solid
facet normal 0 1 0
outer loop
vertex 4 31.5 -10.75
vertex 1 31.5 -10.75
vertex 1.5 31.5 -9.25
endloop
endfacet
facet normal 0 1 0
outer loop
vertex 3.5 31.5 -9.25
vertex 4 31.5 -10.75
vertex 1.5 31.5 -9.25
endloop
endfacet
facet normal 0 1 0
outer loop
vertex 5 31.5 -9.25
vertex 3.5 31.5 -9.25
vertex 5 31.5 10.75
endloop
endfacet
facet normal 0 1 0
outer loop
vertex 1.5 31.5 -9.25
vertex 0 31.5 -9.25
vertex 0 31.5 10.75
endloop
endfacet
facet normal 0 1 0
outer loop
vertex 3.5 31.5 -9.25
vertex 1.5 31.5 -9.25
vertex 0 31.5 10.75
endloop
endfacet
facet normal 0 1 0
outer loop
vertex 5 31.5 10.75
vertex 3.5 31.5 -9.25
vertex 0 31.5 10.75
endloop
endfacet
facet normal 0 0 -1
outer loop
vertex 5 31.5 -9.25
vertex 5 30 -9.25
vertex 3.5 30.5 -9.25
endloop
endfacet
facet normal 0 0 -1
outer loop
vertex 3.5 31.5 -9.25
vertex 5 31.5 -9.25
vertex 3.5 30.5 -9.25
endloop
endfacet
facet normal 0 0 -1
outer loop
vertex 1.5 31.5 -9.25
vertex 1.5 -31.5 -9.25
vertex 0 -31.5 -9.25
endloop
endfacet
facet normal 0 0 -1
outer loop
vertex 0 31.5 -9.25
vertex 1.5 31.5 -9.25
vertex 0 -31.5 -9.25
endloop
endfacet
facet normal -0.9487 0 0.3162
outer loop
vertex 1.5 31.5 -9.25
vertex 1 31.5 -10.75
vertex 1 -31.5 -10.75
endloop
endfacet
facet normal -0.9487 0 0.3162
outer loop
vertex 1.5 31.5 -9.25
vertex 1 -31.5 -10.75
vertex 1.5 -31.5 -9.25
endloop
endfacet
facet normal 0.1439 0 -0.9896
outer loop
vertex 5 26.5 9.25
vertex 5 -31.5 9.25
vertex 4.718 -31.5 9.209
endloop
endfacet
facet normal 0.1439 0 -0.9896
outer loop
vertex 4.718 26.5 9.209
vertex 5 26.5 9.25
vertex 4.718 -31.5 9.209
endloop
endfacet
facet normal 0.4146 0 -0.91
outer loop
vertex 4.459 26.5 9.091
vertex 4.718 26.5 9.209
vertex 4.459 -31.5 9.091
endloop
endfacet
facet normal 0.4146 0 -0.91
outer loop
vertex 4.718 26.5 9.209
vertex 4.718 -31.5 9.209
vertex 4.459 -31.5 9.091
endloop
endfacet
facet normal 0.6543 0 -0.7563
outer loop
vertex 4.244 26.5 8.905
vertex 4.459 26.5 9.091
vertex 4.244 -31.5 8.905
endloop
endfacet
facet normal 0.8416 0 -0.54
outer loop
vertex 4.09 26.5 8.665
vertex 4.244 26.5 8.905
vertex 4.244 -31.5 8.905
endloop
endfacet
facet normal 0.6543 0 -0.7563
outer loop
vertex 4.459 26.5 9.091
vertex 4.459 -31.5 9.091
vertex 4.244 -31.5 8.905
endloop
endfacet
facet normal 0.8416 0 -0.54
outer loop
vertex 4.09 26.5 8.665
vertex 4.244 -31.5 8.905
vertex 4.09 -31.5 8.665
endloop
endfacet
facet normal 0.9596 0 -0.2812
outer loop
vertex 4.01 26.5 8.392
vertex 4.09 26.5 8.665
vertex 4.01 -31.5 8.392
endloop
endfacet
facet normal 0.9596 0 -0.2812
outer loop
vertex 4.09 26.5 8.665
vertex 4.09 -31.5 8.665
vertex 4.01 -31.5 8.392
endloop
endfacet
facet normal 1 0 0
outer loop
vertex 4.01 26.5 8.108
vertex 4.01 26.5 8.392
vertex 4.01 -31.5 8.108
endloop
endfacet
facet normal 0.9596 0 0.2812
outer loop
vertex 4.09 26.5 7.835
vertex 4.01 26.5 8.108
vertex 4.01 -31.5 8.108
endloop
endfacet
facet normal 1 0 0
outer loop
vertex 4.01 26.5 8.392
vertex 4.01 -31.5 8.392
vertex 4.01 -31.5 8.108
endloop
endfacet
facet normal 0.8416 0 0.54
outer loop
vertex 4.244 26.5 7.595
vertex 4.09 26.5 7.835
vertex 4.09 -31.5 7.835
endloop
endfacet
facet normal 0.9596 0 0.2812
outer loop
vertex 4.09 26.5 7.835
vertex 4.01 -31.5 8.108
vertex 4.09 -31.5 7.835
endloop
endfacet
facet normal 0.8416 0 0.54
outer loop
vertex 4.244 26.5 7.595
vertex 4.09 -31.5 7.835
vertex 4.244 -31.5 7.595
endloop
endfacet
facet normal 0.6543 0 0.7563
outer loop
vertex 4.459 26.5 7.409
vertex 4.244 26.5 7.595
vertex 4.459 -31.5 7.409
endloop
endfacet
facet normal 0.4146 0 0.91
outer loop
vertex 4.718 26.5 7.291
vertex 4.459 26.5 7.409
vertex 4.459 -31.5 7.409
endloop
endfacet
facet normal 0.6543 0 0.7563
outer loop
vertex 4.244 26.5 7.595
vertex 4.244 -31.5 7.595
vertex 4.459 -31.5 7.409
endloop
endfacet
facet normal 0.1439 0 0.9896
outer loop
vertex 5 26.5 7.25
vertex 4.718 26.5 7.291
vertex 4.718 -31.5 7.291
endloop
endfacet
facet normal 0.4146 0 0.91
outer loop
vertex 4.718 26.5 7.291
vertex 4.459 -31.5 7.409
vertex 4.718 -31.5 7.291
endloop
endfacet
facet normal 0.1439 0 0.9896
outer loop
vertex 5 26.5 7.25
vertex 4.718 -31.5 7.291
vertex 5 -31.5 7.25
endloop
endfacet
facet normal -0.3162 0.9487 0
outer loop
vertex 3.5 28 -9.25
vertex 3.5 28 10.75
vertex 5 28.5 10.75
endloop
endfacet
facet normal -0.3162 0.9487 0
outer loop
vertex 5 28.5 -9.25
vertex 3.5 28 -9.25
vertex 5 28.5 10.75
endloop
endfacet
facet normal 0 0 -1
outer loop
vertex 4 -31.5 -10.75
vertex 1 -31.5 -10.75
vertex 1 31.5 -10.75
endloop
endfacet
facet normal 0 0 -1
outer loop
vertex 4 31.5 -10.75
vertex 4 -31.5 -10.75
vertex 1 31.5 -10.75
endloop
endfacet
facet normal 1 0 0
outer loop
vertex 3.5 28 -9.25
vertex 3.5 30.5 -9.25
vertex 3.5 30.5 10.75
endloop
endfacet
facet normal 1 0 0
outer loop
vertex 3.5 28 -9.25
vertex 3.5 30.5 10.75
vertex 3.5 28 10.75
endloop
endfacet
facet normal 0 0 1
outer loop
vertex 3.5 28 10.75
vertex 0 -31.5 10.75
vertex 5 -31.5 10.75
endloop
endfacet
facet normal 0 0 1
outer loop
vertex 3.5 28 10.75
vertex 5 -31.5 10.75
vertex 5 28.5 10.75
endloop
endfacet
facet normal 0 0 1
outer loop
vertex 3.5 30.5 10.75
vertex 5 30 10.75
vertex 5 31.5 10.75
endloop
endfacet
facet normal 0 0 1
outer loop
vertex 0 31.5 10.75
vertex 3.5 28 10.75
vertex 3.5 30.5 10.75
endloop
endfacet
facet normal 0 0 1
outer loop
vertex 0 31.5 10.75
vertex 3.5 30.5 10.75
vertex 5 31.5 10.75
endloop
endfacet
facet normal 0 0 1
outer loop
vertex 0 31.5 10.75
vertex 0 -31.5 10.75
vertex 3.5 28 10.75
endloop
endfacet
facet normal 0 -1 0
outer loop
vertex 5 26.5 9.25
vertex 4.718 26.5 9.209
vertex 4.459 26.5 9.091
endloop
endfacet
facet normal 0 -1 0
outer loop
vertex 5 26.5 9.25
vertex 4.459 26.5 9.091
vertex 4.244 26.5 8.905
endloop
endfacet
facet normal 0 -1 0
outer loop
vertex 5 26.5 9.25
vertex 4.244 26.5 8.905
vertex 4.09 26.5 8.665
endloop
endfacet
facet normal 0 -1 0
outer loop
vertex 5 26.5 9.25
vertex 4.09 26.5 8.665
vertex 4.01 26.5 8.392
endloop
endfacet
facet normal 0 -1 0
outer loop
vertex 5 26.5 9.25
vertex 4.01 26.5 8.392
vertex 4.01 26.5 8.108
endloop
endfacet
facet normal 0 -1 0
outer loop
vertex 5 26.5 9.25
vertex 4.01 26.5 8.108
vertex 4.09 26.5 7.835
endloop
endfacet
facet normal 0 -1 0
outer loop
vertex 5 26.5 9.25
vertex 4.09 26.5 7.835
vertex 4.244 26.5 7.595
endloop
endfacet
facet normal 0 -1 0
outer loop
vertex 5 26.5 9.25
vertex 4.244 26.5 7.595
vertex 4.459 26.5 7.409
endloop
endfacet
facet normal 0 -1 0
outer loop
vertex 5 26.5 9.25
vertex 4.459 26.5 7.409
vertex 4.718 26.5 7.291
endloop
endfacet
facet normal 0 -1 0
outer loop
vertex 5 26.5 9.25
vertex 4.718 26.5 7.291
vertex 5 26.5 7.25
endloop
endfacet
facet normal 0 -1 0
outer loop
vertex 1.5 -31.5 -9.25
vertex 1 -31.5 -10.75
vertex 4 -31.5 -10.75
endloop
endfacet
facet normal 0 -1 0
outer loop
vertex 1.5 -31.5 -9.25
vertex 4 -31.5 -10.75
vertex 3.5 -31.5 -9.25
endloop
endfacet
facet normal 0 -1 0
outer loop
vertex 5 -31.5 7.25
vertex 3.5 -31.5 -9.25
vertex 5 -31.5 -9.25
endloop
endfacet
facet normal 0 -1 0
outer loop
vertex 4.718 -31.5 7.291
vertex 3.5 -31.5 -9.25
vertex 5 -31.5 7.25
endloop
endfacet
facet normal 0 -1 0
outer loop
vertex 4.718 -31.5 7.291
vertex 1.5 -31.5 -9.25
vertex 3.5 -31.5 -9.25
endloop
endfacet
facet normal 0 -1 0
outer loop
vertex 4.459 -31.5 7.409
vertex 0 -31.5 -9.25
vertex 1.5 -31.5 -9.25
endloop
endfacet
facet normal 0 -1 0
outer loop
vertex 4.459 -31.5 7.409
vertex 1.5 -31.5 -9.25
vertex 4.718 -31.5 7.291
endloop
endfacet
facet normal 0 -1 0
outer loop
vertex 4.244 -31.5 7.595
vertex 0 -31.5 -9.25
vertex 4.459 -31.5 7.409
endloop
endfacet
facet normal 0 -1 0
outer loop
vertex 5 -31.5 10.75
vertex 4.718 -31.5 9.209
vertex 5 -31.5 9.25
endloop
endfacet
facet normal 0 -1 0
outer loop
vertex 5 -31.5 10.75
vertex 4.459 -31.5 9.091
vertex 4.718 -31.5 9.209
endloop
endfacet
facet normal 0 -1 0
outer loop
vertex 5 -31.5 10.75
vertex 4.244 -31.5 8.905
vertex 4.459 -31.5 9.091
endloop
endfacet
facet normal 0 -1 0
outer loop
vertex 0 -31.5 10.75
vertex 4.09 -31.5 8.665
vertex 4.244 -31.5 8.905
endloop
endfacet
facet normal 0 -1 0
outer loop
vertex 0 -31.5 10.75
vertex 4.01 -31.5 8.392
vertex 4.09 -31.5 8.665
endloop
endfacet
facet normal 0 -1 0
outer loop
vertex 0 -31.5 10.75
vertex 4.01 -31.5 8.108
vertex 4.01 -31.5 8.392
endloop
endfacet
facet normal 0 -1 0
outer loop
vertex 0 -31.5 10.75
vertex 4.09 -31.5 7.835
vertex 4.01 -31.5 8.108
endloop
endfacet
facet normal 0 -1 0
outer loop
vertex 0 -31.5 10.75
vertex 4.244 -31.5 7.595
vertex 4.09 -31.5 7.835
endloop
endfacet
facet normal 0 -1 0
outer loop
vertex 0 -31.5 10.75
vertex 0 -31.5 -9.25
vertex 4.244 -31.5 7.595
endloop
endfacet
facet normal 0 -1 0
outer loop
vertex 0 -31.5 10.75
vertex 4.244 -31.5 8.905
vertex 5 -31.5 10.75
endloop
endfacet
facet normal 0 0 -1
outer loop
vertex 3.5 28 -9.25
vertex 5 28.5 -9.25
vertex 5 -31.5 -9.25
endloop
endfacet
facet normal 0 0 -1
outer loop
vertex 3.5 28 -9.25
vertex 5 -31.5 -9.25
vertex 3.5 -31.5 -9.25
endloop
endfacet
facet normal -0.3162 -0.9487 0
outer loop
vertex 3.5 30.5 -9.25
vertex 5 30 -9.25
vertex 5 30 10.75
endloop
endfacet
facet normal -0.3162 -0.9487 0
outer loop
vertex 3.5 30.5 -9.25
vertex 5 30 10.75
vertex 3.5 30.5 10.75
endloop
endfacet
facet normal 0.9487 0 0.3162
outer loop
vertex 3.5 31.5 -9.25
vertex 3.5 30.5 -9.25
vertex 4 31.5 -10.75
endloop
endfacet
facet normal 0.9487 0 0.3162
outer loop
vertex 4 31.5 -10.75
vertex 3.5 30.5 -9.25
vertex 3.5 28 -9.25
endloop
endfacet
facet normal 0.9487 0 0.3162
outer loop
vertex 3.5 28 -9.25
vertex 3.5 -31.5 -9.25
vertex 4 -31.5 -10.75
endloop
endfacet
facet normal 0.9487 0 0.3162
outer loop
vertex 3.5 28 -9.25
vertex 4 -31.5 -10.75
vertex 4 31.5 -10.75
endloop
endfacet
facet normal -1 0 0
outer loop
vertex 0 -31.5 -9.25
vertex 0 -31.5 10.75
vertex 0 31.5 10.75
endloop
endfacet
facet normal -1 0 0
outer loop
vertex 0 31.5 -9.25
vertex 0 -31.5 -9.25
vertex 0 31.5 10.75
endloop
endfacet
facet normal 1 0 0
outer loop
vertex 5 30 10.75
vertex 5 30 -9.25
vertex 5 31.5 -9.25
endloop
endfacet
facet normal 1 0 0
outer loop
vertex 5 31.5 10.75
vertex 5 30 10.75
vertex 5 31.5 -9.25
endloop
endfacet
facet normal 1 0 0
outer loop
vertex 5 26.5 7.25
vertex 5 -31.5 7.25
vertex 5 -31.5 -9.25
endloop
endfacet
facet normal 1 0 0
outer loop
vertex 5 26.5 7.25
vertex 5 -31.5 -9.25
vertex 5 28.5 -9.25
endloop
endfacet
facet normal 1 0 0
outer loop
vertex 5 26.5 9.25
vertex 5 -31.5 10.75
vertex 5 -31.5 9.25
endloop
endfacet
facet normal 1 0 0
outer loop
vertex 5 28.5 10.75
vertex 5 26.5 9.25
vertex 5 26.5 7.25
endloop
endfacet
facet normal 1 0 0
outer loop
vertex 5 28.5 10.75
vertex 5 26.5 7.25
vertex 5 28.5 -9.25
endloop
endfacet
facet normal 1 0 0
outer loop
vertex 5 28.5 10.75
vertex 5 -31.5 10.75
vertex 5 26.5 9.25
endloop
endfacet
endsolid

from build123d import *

# Parameters (mm, degrees)
F0_W     = 63
F0_H     = 21.5
F1_DEPTH = 5
F3_DEPTH = 58
F4_DEPTH = 63.001
F6_DEPTH = 20


with BuildPart() as f1:
    # F0 (on Right) → F1 (new body)
    with BuildSketch(Plane.YZ):
        Rectangle(F0_W, F0_H)
    extrude(amount=F1_DEPTH)

    # F2 (on face) → F3 (cut)
    with BuildSketch(Plane.XZ.offset(31.5)):
        with BuildLine():
            Line((5, 7.25), (5, 9.25))
            ThreePointArc((5, 9.25), (4, 8.25), (5, 7.25))
        make_face()
    extrude(amount=-F3_DEPTH, mode=Mode.SUBTRACT)

    # F2 (on face) → F4 (cut, through all)
    with BuildSketch(Plane.XZ.offset(31.5)):
        Polygon((1.5, -9.25), (0, -9.25), (0, -10.75), (1, -10.75), align=None)
        Polygon((3.5, -9.25), (4, -10.75), (5, -10.75), (5, -9.25), align=None)
    extrude(amount=-F4_DEPTH, mode=Mode.SUBTRACT)

    # F5 (on face) → F6 (cut, through all)
    with BuildSketch(Plane.XY.offset(10.75)):
        Polygon((5, 28.5), (5, 30), (3.5, 30.5), (3.5, 28), align=None)
    extrude(amount=-F6_DEPTH, mode=Mode.SUBTRACT)


solid = f1.part
